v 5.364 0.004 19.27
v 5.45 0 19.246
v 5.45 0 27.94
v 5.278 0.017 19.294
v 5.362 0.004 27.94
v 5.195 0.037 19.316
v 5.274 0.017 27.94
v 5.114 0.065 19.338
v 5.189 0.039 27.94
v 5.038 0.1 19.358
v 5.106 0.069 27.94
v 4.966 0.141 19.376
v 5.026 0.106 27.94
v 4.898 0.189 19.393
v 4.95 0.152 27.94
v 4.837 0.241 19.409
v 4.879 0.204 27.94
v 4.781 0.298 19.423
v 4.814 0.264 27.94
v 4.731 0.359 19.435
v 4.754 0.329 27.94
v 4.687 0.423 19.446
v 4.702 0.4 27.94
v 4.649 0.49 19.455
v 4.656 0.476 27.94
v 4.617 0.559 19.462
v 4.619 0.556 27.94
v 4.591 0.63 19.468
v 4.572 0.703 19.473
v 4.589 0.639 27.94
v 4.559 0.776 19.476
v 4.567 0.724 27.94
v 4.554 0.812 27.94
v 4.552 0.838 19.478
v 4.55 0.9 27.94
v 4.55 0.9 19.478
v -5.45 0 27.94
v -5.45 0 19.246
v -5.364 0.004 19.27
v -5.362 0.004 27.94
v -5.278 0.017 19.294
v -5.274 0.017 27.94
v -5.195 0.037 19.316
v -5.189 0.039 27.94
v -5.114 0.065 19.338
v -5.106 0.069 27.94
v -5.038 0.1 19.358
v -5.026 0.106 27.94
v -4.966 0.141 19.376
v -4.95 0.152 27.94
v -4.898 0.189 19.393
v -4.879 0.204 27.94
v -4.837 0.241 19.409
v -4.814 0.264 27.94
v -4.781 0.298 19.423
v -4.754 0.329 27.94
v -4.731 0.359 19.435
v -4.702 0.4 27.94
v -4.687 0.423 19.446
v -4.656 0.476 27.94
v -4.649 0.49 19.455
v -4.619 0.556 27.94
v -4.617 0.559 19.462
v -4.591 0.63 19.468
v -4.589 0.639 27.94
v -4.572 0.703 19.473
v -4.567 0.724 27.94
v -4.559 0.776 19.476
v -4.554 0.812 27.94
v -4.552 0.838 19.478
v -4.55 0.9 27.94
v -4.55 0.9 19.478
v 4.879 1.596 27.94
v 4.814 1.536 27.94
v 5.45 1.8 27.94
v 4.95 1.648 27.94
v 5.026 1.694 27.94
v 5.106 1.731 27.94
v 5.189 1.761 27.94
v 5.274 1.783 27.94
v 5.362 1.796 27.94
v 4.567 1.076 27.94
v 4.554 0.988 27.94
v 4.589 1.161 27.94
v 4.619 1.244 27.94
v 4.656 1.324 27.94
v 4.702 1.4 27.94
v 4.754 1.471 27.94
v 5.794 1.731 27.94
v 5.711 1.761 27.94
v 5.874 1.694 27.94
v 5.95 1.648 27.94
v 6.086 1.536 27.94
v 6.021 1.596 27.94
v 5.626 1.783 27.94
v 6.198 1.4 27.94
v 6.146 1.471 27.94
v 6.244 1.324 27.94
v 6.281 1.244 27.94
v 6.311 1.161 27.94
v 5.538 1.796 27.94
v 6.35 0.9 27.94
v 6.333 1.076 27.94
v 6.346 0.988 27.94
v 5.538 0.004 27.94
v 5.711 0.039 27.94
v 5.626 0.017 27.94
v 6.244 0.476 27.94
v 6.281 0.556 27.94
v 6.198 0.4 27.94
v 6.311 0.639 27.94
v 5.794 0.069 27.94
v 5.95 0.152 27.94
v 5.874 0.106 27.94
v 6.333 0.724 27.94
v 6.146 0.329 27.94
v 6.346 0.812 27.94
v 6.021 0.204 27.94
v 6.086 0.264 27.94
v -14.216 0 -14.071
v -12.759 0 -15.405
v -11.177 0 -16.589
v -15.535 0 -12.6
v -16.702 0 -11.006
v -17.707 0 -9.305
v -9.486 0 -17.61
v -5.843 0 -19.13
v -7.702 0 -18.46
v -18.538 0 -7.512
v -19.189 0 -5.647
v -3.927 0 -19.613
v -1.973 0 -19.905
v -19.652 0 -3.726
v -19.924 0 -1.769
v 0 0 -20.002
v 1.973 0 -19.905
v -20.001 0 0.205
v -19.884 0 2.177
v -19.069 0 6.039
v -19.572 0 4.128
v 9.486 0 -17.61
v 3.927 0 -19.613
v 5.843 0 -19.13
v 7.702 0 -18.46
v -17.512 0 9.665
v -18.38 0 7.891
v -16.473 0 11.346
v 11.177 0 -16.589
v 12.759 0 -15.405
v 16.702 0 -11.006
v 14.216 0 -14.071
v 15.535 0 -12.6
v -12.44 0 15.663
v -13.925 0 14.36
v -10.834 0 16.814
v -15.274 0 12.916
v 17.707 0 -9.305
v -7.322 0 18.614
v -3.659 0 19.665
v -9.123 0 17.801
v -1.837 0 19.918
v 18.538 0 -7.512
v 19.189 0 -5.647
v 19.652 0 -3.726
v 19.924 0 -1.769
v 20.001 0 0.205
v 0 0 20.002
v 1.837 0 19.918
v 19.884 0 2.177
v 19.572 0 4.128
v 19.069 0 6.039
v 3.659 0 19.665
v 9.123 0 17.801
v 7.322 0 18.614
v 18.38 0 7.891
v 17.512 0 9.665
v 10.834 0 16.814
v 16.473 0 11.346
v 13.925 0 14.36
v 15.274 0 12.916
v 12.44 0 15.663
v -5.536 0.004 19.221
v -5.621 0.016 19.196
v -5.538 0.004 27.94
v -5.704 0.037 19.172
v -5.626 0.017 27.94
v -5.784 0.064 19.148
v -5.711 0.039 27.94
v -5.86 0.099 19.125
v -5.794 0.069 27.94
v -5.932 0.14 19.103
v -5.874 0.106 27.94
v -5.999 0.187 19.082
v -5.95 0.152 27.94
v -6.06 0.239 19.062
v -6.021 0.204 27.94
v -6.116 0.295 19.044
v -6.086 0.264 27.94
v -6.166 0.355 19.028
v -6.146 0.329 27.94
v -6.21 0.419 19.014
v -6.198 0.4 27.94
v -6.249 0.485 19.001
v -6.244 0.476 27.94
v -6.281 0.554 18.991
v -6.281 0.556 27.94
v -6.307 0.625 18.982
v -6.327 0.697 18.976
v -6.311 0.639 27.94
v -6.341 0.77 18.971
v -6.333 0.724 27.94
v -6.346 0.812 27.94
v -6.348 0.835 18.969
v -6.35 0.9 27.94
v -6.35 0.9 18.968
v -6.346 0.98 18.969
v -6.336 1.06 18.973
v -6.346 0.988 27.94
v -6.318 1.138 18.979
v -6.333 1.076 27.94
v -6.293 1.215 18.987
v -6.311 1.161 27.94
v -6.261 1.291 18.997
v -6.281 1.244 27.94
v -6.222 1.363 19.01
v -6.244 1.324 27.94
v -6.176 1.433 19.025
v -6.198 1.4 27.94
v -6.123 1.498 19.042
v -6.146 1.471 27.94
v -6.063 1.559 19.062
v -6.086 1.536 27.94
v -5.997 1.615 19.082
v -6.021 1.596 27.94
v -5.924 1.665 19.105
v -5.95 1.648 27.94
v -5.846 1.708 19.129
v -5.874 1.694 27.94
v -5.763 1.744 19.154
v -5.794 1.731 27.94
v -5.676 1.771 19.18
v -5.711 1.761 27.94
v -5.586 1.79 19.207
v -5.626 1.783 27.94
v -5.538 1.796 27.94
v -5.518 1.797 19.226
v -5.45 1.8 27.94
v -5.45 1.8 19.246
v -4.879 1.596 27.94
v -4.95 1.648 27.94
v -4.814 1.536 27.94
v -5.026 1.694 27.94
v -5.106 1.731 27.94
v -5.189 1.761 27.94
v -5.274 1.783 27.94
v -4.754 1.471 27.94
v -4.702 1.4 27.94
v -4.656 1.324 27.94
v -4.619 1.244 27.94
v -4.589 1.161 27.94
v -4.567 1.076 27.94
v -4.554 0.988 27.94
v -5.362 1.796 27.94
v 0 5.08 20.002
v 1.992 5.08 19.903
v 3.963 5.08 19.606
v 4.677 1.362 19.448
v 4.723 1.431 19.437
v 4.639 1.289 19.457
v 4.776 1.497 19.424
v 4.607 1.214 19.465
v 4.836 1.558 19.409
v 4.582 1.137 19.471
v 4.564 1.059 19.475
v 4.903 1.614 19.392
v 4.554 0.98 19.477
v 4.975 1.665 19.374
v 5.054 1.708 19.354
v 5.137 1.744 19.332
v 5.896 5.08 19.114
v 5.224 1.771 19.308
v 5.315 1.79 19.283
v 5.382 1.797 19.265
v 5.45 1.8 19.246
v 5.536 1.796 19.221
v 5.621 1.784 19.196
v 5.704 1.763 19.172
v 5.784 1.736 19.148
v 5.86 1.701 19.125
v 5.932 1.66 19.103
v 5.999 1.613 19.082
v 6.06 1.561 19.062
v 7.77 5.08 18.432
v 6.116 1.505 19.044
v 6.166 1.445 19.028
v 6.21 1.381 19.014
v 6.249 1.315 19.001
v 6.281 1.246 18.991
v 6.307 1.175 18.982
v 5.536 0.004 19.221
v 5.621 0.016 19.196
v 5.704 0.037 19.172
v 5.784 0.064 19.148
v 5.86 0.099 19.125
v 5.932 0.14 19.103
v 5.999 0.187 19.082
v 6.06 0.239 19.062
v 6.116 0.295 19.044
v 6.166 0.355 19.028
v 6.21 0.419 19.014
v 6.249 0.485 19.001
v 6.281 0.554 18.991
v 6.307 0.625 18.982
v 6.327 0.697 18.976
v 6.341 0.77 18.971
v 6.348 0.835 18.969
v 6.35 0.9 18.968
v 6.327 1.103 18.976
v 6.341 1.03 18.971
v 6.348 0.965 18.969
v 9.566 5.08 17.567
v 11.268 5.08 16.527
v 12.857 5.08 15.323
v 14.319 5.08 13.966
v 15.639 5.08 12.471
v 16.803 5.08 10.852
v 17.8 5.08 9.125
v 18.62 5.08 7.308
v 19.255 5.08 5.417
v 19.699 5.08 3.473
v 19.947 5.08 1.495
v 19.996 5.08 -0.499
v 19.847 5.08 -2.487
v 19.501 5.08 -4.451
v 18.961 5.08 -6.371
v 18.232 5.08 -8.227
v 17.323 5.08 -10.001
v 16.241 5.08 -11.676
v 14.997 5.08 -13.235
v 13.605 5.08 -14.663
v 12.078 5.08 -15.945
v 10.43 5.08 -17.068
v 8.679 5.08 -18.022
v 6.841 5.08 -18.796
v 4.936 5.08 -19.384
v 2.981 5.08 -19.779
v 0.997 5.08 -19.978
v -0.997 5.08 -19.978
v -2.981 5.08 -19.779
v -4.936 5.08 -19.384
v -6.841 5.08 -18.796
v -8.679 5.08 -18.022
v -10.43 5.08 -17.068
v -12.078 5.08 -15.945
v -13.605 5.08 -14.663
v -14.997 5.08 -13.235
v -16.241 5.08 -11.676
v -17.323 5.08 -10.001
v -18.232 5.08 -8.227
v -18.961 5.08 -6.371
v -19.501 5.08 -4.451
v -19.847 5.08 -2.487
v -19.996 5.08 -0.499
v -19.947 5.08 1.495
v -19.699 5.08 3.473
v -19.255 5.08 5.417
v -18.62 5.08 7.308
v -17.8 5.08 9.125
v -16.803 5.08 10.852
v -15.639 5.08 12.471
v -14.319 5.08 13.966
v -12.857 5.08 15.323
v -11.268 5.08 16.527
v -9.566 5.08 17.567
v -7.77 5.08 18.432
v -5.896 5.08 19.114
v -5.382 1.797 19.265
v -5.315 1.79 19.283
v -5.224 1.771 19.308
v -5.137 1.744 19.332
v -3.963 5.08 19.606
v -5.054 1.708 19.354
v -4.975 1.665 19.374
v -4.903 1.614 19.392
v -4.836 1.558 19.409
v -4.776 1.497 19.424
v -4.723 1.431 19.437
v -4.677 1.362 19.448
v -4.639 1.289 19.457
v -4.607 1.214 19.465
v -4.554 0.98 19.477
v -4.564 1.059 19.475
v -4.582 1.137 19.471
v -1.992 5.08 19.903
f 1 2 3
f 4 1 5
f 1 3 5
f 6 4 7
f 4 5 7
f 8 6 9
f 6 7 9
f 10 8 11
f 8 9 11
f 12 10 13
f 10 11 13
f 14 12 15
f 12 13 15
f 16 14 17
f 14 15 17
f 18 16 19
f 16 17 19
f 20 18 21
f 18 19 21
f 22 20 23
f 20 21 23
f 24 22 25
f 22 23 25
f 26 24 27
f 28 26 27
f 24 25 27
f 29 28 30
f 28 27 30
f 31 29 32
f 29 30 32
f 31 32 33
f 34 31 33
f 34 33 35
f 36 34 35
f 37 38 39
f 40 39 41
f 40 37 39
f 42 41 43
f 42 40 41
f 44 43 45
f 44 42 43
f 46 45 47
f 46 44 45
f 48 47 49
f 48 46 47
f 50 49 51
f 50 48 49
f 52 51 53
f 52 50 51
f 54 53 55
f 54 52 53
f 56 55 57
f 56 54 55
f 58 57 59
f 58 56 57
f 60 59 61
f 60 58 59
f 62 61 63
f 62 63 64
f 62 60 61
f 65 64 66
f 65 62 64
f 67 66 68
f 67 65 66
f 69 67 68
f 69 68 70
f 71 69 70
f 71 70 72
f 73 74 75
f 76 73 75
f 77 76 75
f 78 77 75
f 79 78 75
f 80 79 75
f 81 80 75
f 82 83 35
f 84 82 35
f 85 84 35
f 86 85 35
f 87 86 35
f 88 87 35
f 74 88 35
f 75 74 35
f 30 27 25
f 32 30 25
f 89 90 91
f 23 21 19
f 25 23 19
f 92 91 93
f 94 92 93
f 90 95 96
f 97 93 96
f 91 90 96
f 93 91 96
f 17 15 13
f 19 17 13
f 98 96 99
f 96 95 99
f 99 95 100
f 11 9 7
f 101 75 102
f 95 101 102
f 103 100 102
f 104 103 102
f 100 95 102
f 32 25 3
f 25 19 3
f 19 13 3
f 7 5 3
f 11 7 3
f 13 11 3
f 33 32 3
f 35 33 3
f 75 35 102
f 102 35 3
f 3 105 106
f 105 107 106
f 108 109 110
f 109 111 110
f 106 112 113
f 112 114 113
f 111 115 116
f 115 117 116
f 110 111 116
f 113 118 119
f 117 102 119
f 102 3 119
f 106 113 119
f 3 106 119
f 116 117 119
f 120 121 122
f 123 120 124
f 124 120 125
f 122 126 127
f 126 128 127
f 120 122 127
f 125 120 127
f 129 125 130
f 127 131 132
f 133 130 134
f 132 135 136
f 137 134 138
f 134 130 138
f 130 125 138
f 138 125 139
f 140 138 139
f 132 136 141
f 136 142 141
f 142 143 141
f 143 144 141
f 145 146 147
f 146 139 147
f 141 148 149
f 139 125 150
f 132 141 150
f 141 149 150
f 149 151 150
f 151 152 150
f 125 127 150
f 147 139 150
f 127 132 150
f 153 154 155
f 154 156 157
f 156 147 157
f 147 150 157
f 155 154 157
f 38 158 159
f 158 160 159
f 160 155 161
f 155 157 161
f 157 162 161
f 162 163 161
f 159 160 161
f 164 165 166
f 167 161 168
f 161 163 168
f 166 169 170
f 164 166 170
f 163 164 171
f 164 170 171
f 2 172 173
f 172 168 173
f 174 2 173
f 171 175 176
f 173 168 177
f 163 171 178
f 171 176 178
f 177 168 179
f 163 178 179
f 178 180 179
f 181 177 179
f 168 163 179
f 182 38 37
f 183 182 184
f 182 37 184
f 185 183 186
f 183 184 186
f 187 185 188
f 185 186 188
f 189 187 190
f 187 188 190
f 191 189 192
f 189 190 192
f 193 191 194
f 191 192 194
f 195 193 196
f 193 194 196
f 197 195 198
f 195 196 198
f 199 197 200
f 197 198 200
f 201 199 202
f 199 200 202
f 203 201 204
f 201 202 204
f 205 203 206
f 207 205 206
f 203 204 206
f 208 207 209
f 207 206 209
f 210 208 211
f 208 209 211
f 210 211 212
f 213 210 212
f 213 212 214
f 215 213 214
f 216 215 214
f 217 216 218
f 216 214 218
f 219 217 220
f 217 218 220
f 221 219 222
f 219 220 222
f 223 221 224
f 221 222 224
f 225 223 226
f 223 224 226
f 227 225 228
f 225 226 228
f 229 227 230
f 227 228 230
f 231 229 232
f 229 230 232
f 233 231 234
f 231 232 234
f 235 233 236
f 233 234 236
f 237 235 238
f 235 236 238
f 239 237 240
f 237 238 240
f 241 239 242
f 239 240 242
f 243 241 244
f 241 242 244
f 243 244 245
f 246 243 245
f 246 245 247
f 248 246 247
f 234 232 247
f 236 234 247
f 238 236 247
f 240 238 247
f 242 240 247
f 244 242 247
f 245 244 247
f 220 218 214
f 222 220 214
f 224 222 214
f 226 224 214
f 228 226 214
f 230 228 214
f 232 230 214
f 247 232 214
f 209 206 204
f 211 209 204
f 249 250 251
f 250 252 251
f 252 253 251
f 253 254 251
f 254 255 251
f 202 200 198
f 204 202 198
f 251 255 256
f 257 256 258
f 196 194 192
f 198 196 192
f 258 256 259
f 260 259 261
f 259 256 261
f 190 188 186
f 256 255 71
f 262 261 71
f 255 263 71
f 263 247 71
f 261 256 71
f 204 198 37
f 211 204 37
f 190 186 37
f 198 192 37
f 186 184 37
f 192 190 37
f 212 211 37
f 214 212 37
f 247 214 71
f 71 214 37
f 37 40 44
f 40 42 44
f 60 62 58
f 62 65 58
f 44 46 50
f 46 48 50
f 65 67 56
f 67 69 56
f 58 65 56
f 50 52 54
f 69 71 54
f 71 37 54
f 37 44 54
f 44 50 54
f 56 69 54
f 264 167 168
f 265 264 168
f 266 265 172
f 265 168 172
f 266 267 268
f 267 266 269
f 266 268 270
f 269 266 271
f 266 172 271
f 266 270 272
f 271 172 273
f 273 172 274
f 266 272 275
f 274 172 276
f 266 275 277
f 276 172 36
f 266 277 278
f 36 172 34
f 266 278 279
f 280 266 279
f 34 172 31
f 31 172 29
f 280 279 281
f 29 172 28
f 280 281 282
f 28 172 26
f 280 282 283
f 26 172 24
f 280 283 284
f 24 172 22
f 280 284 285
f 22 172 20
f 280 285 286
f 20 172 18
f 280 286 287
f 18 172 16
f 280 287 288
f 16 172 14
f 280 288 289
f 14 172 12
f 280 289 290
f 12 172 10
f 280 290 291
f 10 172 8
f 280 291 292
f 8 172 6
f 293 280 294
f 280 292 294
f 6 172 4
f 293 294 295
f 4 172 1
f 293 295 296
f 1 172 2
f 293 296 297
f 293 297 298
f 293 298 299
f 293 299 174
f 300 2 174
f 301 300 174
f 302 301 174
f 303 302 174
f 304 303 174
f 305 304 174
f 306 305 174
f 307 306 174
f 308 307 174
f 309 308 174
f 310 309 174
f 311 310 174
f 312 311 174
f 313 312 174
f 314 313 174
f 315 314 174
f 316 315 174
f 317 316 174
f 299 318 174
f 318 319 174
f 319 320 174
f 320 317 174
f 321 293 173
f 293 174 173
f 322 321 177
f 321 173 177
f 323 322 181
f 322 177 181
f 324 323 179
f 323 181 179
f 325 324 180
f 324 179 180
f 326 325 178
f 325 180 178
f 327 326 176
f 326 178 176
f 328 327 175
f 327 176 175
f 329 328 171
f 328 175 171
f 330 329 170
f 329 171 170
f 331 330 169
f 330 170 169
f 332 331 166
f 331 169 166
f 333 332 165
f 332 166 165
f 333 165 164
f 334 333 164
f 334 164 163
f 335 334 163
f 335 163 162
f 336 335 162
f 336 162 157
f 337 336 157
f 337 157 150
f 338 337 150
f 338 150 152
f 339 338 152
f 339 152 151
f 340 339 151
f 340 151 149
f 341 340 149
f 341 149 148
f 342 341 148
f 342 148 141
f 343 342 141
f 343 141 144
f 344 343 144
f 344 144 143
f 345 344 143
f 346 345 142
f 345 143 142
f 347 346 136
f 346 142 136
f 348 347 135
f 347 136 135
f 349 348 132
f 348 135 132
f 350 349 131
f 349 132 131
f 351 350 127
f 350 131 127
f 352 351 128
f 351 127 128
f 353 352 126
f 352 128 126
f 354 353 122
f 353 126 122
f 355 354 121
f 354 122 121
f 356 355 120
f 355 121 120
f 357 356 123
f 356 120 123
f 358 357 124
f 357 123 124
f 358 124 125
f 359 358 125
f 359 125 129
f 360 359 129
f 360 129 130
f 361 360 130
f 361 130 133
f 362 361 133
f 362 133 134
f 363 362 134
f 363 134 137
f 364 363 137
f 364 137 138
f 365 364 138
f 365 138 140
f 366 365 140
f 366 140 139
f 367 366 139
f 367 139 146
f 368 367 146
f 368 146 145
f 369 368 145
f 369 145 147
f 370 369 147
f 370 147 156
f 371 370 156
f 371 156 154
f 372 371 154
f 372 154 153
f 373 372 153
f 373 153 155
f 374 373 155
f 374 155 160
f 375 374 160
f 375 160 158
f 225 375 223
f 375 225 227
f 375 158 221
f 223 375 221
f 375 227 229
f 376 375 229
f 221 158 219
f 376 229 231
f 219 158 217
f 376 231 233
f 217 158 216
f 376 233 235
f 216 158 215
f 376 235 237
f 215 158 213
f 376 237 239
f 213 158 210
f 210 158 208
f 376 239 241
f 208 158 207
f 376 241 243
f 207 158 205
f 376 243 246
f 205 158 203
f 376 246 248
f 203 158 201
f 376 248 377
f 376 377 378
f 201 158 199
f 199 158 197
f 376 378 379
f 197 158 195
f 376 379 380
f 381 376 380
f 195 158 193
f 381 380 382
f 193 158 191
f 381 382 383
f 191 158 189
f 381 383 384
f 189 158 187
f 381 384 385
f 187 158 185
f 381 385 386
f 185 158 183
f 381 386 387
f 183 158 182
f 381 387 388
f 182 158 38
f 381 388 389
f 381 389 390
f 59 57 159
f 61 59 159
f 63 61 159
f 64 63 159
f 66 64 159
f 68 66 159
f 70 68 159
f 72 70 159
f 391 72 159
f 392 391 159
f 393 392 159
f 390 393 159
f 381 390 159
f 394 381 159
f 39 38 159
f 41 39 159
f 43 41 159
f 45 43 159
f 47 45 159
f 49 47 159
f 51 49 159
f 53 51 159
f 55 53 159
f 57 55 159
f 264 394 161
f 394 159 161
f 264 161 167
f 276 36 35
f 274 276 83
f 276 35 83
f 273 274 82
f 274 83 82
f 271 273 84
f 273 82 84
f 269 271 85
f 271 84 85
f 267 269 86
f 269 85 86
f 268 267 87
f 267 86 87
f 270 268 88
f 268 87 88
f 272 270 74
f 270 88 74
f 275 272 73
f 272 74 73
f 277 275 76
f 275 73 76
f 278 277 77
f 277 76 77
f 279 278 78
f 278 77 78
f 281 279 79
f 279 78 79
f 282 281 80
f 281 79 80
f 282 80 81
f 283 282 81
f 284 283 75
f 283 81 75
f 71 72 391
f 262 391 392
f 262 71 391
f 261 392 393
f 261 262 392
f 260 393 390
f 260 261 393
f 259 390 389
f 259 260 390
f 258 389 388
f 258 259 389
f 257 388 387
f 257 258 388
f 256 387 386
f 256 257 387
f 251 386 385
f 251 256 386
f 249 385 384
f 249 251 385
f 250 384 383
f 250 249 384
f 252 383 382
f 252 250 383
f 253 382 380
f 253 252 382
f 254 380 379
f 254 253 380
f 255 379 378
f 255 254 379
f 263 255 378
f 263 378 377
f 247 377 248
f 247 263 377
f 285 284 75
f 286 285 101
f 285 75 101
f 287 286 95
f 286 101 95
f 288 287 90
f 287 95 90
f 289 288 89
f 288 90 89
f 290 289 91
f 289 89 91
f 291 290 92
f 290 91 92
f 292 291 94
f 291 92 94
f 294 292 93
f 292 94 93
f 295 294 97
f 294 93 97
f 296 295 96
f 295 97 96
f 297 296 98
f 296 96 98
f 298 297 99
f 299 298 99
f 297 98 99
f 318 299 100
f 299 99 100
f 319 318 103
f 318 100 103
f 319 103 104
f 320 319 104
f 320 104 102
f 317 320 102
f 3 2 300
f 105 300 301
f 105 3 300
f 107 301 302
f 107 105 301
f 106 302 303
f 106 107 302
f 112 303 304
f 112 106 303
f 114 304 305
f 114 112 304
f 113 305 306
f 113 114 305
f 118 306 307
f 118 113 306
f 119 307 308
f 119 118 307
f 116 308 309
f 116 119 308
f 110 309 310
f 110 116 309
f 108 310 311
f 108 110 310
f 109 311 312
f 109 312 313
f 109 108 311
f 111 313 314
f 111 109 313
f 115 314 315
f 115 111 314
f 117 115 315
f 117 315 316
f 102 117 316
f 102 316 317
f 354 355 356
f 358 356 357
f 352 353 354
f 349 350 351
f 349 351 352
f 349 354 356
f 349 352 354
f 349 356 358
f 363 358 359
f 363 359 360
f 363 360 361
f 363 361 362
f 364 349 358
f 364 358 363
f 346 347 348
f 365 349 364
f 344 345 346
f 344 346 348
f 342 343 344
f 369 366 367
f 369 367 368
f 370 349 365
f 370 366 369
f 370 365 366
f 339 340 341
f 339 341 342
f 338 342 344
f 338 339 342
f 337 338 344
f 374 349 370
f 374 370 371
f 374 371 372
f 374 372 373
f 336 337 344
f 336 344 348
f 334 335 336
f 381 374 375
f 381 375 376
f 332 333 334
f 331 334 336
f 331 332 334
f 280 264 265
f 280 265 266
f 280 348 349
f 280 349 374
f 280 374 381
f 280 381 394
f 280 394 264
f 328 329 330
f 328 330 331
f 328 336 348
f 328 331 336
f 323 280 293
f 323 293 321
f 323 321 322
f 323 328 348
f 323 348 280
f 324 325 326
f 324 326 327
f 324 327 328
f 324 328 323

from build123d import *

# Parameters (mm, degrees)
SKETCH1_R           = 20.0025
BOSS_EXTRUDE1_DEPTH = 5.08
SKETCH2_W           = 1.8
SKETCH2_H           = 15.24
BOSS_EXTRUDE2_DEPTH = 1.8
FILLET1_R           = 0.9


with BuildPart() as part:
    # Sketch1 → Boss-Extrude1 (new body)
    with BuildSketch(Plane(origin=(0, 0, 0), x_dir=(1, 0, 0), z_dir=(0, 1, 0))):
        with Locations(Location((0, 0, 0), (0, 0, 270))):
            Circle(SKETCH1_R)
    extrude(amount=BOSS_EXTRUDE1_DEPTH)

    # Sketch2 → Boss-Extrude2 (add)
    with BuildSketch(Plane.XZ):
        with Locations((-5.45, 20.32)):
            Rectangle(SKETCH2_W, SKETCH2_H)
        with Locations((5.45, 20.32)):
            Rectangle(SKETCH2_W, SKETCH2_H)
    extrude(amount=-BOSS_EXTRUDE2_DEPTH)

    # Fillet1
    fillet1_edges = [part.edges().sort_by_distance(p)[0] for p in [
        (6.35, 1.8, 23.453900915),
        (6.35, 0, 23.453900915),
        (4.55, 1.8, 23.70906446),
        (4.55, 0, 23.70906446),
        (-6.35, 1.8, 23.453900915),
        (-4.55, 1.8, 23.70906446),
        (-6.35, 0, 23.453900915),
        (-4.55, 0, 23.70906446),
    ]]
    fillet(fillet1_edges, radius=FILLET1_R - 0.0001)  # a hair under: the kernel refuses the full size


solid = part.part
